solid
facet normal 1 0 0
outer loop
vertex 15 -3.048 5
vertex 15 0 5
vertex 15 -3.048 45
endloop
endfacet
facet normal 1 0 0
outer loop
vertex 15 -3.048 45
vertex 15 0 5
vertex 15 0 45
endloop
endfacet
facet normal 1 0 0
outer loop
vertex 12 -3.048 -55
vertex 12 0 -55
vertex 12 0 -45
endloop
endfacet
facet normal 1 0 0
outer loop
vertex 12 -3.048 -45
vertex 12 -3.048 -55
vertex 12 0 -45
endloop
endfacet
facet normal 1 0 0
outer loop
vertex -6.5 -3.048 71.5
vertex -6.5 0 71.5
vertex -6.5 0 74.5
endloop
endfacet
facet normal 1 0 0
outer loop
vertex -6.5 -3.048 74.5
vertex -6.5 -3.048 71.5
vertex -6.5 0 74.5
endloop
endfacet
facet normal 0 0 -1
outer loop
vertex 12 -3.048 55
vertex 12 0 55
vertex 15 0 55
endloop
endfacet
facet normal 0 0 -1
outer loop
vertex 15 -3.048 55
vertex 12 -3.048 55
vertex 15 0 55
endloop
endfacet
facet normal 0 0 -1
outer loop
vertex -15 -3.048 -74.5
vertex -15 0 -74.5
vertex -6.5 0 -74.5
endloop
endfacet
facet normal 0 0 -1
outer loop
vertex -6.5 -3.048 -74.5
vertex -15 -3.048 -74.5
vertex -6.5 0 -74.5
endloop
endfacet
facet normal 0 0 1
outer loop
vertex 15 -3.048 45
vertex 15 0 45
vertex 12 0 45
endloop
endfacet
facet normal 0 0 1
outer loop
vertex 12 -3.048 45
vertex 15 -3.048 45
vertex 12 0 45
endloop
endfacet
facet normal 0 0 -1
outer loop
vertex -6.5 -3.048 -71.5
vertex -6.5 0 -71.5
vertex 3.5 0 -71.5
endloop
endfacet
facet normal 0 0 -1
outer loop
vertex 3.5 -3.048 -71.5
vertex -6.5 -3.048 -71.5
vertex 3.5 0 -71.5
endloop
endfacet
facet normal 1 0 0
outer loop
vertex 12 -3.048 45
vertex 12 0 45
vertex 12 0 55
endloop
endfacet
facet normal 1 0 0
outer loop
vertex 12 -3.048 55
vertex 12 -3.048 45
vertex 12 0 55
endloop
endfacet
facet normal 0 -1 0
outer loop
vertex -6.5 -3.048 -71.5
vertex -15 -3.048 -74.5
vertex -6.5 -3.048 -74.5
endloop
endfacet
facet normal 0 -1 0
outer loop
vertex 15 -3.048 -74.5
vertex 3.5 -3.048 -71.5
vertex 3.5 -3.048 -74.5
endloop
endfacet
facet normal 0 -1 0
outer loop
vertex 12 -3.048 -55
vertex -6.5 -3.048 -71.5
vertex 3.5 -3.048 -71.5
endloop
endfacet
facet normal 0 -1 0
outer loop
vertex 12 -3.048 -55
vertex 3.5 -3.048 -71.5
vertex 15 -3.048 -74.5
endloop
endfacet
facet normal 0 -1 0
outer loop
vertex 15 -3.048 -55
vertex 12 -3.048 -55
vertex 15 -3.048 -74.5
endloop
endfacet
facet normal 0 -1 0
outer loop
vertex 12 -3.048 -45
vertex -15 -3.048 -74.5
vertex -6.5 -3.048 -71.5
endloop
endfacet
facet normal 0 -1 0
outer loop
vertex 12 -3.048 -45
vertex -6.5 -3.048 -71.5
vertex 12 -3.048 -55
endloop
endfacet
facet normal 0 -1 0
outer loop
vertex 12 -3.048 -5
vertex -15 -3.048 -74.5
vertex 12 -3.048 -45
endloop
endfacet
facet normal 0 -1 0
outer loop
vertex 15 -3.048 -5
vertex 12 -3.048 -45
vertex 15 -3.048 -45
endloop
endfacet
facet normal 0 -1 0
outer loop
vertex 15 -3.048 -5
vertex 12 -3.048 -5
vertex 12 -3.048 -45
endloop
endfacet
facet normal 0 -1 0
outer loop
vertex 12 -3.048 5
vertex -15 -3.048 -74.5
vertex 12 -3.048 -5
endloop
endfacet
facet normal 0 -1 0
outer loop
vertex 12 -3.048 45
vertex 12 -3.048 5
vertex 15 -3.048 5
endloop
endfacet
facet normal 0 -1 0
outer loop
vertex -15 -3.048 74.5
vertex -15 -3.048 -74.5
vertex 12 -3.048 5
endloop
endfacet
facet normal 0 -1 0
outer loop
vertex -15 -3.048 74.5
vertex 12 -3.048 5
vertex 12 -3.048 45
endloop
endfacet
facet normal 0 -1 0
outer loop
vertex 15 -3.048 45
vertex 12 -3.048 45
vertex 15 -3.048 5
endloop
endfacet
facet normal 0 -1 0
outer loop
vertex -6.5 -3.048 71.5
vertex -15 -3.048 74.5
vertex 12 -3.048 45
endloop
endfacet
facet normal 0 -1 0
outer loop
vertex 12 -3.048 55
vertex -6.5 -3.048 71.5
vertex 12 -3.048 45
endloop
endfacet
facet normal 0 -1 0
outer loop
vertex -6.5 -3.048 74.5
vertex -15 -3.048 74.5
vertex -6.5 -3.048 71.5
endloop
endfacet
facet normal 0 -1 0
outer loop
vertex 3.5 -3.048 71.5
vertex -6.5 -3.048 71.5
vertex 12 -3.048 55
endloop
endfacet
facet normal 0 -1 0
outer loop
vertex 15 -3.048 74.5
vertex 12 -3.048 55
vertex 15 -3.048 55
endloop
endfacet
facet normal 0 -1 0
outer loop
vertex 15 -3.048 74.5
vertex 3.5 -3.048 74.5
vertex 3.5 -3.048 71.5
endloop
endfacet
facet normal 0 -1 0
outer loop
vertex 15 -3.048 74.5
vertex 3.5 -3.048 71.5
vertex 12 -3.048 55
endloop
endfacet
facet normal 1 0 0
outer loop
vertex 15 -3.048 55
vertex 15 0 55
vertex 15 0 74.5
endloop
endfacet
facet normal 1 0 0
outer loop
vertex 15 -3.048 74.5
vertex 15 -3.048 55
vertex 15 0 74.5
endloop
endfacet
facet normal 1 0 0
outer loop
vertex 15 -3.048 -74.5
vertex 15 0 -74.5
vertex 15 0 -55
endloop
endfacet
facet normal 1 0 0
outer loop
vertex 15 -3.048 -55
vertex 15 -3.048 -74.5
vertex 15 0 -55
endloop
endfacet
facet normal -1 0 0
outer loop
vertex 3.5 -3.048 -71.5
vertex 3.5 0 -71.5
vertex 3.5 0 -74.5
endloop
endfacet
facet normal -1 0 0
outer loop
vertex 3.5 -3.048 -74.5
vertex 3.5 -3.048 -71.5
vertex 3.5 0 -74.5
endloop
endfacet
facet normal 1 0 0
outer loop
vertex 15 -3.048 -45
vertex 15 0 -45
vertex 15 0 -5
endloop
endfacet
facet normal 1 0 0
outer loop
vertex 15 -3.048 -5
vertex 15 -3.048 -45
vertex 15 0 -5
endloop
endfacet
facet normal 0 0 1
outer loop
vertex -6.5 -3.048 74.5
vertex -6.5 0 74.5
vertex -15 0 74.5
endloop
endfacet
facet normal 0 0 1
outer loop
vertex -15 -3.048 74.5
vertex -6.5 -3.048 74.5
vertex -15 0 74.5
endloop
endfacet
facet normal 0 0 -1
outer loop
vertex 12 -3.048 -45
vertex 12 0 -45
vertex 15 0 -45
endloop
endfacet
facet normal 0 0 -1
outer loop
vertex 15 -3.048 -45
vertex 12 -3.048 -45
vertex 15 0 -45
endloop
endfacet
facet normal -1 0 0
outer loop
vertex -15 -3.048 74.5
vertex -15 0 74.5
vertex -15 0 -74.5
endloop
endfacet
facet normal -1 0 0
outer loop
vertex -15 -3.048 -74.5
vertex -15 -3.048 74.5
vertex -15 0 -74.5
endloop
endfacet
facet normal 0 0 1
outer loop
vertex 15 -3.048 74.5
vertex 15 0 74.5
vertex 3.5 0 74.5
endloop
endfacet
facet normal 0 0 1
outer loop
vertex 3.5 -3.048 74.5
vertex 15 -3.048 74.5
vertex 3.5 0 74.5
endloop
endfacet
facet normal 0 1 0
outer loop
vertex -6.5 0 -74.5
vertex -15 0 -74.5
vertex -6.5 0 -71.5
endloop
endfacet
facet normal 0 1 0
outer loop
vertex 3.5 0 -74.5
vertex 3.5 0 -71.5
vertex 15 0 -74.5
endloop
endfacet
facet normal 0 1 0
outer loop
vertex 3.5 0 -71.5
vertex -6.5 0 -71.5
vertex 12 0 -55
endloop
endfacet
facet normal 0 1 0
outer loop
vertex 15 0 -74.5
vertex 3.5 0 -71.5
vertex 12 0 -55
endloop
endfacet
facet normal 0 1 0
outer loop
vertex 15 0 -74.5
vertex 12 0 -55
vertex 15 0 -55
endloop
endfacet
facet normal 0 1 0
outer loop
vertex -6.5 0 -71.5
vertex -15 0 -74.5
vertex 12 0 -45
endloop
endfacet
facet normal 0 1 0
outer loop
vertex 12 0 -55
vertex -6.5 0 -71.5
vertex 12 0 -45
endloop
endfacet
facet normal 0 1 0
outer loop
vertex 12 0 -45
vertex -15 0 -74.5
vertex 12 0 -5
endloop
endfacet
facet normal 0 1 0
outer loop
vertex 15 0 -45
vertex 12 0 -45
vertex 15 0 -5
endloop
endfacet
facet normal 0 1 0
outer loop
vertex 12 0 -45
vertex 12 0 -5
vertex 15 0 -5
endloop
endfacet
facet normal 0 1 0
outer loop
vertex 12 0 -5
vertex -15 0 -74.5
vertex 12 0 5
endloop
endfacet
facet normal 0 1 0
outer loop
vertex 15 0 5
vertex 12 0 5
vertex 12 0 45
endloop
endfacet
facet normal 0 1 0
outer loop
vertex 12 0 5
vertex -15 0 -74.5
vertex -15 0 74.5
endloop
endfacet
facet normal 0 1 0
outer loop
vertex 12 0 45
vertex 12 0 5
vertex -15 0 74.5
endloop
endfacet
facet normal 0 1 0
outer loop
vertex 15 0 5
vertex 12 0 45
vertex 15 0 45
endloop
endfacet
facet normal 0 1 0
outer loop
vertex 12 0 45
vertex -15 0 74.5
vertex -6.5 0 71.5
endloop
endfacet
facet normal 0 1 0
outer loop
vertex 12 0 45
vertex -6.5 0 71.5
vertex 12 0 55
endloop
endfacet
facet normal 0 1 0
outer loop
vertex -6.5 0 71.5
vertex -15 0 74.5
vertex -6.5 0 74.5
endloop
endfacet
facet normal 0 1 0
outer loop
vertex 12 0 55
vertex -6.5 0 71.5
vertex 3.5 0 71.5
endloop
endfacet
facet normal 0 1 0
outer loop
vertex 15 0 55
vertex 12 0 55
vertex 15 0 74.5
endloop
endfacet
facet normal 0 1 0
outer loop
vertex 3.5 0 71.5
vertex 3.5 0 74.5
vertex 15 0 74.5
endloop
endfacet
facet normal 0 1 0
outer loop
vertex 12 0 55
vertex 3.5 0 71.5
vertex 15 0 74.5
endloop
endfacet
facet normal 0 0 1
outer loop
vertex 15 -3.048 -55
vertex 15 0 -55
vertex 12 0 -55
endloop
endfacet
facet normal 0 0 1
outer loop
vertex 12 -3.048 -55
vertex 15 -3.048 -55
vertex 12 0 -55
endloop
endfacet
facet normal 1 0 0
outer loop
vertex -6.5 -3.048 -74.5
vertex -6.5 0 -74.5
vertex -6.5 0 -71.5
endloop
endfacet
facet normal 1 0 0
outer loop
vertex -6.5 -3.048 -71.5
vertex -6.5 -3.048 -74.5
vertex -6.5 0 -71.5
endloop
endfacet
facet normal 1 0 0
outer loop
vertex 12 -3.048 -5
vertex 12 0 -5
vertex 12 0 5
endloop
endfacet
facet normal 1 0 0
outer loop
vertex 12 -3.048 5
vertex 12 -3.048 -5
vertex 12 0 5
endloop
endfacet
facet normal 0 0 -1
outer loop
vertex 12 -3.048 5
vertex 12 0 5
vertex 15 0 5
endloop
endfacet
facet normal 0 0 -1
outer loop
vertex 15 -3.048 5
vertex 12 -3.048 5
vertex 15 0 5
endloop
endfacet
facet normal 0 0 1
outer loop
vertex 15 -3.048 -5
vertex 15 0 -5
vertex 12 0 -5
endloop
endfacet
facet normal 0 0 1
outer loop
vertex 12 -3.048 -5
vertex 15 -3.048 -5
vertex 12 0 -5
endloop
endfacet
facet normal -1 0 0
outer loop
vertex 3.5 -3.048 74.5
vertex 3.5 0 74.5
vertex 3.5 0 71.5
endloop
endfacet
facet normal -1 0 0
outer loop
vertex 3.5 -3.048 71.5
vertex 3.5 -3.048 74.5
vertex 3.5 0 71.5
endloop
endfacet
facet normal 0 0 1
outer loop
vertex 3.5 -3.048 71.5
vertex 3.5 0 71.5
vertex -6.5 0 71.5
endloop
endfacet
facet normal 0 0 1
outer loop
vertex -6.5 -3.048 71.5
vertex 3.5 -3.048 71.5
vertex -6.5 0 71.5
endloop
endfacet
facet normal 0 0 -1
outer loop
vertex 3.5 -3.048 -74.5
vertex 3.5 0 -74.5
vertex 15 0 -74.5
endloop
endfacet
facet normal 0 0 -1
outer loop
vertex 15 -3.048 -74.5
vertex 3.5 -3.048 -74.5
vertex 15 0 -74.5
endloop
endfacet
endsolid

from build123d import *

# Parameters (mm, degrees)
F1_DEPTH = 3.048


with BuildPart() as f1:
    # F0 (on Front) → F1 (new body)
    with BuildSketch(Plane.XZ):
        Polygon((-6.500012, -74.500003), (-6.500012, -71.500009), (3.499993, -71.500009), (3.499993, -74.500003), (14.999995, -74.500003), (14.999995, -54.999992), (12.000001, -54.999992), (12.000001, -45.000012), (14.999995, -45.000012), (14.999995, -4.99999), (12.000001, -4.99999), (12.000001, 4.99999), (14.999995, 4.99999), (14.999995, 45.000012), (12.000001, 45.000012), (12.000001, 54.999992), (14.999995, 54.999992), (14.999995, 74.500003), (3.499993, 74.500003), (3.499993, 71.500009), (-6.500012, 71.500009), (-6.500012, 74.500003), (-14.999995, 74.500003), (-14.999995, -74.500003), align=None)
    extrude(amount=F1_DEPTH)


solid = f1.part
